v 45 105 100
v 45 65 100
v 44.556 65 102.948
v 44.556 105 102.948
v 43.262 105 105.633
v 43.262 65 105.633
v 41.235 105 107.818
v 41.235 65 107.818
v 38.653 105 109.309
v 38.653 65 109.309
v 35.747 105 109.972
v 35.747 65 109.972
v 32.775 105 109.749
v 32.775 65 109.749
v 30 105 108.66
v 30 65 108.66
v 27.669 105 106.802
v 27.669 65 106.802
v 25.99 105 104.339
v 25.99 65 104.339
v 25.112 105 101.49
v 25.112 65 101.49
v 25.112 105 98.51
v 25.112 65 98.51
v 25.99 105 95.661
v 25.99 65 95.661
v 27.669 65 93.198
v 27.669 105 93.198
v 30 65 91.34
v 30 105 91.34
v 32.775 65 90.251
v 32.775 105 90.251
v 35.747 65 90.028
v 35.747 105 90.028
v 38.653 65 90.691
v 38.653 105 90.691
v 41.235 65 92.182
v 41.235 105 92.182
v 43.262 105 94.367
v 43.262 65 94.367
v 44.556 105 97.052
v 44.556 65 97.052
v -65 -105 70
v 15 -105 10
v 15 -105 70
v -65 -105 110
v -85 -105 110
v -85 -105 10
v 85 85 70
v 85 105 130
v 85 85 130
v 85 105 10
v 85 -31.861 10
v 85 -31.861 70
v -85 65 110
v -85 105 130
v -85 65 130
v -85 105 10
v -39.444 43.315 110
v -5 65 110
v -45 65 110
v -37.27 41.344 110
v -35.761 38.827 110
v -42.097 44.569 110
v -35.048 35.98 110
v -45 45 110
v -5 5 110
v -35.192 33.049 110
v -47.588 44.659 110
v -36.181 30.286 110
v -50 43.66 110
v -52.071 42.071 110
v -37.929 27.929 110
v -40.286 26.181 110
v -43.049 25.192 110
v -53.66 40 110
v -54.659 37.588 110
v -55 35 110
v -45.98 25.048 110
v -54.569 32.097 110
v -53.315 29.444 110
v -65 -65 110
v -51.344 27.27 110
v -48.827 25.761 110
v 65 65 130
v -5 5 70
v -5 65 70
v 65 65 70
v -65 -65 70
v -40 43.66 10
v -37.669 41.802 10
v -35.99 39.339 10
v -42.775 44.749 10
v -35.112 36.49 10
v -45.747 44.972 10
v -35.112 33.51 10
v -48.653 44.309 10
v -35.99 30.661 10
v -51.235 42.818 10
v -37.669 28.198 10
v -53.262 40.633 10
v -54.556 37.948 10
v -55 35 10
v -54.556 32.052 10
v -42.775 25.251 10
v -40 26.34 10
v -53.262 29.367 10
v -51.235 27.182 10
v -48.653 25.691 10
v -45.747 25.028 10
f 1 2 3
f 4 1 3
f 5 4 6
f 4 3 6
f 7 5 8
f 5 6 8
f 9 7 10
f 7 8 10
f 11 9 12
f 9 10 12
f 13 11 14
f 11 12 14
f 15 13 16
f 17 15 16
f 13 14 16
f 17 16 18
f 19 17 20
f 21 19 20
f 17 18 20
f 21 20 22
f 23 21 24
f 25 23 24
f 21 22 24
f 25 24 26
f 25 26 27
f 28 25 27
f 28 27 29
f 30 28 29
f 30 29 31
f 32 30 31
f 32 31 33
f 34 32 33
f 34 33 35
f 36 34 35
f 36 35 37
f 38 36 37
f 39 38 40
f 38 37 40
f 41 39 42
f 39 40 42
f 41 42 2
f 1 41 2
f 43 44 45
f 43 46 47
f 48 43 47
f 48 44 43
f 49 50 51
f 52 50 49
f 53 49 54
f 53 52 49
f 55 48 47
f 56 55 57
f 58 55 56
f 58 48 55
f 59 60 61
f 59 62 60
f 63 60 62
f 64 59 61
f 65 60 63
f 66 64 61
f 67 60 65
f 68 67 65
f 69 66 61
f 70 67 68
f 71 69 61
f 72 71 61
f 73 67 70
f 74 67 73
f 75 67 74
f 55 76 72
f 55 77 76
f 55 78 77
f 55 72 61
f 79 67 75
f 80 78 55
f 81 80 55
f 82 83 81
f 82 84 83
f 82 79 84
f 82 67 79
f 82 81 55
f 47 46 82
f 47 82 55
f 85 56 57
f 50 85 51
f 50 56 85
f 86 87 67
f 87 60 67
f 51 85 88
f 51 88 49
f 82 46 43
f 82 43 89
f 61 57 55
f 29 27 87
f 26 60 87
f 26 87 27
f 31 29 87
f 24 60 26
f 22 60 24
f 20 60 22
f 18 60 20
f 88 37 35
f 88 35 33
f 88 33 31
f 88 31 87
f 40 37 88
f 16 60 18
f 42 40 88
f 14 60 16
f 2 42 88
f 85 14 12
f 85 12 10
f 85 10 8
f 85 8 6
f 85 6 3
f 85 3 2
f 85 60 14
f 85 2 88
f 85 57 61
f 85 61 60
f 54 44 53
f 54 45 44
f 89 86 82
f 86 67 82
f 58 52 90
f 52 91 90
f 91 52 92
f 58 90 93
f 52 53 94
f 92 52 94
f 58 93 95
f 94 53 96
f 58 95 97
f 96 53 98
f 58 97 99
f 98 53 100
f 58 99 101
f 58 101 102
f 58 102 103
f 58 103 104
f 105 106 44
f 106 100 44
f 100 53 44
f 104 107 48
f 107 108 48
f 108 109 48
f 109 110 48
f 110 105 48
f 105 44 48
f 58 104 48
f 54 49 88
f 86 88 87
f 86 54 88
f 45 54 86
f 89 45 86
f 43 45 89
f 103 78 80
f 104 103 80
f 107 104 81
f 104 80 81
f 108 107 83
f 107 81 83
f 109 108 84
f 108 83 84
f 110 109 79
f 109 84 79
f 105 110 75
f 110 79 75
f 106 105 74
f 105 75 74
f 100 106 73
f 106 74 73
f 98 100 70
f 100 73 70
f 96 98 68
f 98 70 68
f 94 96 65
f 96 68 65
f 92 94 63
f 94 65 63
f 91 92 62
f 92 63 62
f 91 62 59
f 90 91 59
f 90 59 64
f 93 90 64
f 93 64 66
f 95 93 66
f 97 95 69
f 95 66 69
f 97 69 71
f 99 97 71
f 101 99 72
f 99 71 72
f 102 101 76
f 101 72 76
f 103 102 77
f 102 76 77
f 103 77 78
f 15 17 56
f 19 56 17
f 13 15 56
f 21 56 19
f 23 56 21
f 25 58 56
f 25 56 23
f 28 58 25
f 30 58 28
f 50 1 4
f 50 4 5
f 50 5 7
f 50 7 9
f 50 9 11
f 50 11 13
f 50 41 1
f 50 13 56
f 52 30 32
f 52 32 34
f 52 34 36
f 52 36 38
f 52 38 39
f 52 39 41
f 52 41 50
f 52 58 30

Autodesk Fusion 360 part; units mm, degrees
sketch "Sketch1" plane through (0, 0, 0) normal (0, 0, 1) x (1, 0, 0)
  line L0 (79.2263, -110) -> (-80.7737, -110)
  line L1 (-80.7737, -110) -> (-80.7737, 110)
  line L2 (-80.7737, 110) -> (79.2263, 110)
  line L3 (79.2263, 110) -> (79.2263, -110)
  line L4 (79.2263, -110) -> (-80.7737, 110) construction
  line L5 (-80.7737, -110) -> (79.2263, 110) construction
  point P0 (-0.7737, 0)
  dimension "d1" = 160
  dimension "d2" = 220
sketch "Sketch2" plane through (0, 0, 130) normal (0, 0, 1) x (-1, 0, 0)
  line L0 (-79.2263, -110) -> (80.7737, -110)
  line L1 (80.7737, -110) -> (80.7737, 110)
  line L2 (80.7737, 110) -> (-79.2263, 110)
  line L3 (-79.2263, 110) -> (-79.2263, -110)
  line L4 (-20, 110) -> (-79.2263, 29.9287)
sketch "Sketch3" plane through (0, 0, 0) normal (0, 0, 1) x (1, 0, 0)
  line L0 (85, -105) -> (-85, -105)
  line L1 (-85, -105) -> (-85, 105)
  line L2 (-85, 105) -> (85, 105)
  line L3 (85, 105) -> (85, -105)
  line L4 (85, -105) -> (-85, 105) construction
  line L5 (-85, -105) -> (85, 105) construction
  dimension "d7" = 170
  dimension "d8" = 210
extrude "Extrude3" add sketch "Sketch3" along normal blind 130
sketch "Sketch4" plane through (0, 0, 130) normal (0, 0, 1) x (-1, 0, 0)
  line L0 (-85, -105) -> (85, -105)
  line L1 (85, -105) -> (85, 105)
  line L2 (85, 105) -> (-85, 105)
  line L3 (-85, 105) -> (-85, -105)
  line L4 (-85, 105) -> (-15, 105)
  line L5 (-85, 101.8612) -> (-85, 31.8612)
  line L6 (-15, 105) -> (-85, 31.8612)
  line L7 (85, 105) -> (65, 105)
  line L8 (65, 105) -> (65, 65)
  line L9 (85, -105) -> (85, -65)
  line L10 (85, -65) -> (-65, -65)
  line L11 (-85, -105) -> (-85, -85)
  line L12 (-65, -65) -> (-85, -85)
  line L13 (85, -65) -> (5, -65)
  line L14 (5, -65) -> (5, -5)
  line L15 (5, -5) -> (65, 65)
  line L16 (85, -65) -> (45, -65)
  line L17 (45, -65) -> (45, -35)
  circle A0 centre (45, -35) radius 10
  dimension "d11" = 70
  dimension "d12" = 70
  dimension "d15" = 20
  dimension "d16" = 40
  dimension "d17" = 40
  dimension "d18" = 150
  dimension "d19" = 20
  dimension "d20" = 80
  dimension "d21" = 60
  dimension "d26" = 40
  dimension "d27" = 30
  dimension "d28" = 20
extrude "Extrude4" cut sketch "Sketch4" against normal blind 130 contours L2 L3 L4 L5 L6
extrude "Extrude5" cut sketch "Sketch4" against normal blind 60 contours L2 L3 L6 L8 L10 L12 L14 L15
extrude "Extrude6" cut sketch "Sketch4" against normal blind 20 contours A0 | L1 L2 L7 L8 L10 L13 L14 L15 L16
extrude "Extrude7" cut sketch "Sketch4" against normal blind 130 contours A0
sketch "Sketch5" plane through (0, 65, 0) normal (0, -1, 0) x (1, 0, 0)
  line L0 (65, 130) -> (-85, 130)
  line L1 (-85, 130) -> (-85, 110)
  line L2 (-85, 110) -> (-5, 110)
  line L3 (-5, 110) -> (-5, 70)
  line L4 (-5, 70) -> (65, 70)
  line L5 (65, 70) -> (65, 130)
  line L6 (65, 130) -> (35, 130)
  line L7 (35, 130) -> (35, 100)
  circle A0 centre (35, 100) radius 10
  dimension "d31" = 30
  dimension "d32" = 30
  dimension "d33" = 20
extrude "Extrude8" cut sketch "Sketch5" against normal blind 40 contours A0
sketch "Sketch6" plane through (85, 0, 0) normal (1, 0, 0) x (0, 1, 0)
  line L0 (85, 130) -> (85, 70)
  line L1 (85, 70) -> (-31.8612, 70)
  line L2 (-31.8612, 70) -> (-31.8612, 0)
  line L3 (-31.8612, 0) -> (105, 0)
  line L4 (105, 0) -> (105, 130)
  line L5 (105, 130) -> (85, 130)
  line L6 (105, 0) -> (105, 10)
  line L7 (105, 10) -> (-105.2237, 10)
  dimension "d36" = 10
extrude "Extrude9" cut sketch "Sketch6" against normal blind 300 contours L2 L3 L4 L6 L7
sketch "Sketch7" plane through (60.2783, -57.6914, 0) normal (0.7224, -0.6914, 0) x (0.6914, 0.7224, 0)
  line L0 (35.7542, 70) -> (-65.4846, 70)
  line L1 (-65.4846, 70) -> (-65.4846, 0)
  line L2 (-65.4846, 0) -> (35.7542, 0)
  line L3 (35.7542, 0) -> (35.7542, 10)
  line L4 (35.7542, 10) -> (35.7542, 70)
  line L5 (-65.4846, 0) -> (-65.4846, 10)
  line L6 (-65.4846, 10) -> (35.7542, 10)
  dimension "d39" = 10
extrude "Extrude10" cut sketch "Sketch7" against normal blind 399 contours L1 L2 L3 L5 L6
sketch "Sketch8" plane through (0, -105, 0) normal (0, -1, 0) x (1, 0, 0)
  line L0 (-65, 110) -> (-85, 110)
  line L1 (-85, 110) -> (-85, 0)
  line L2 (-85, 0) -> (15, 0)
  line L3 (15, 0) -> (15, 10)
  line L4 (15, 10) -> (15, 70)
  line L5 (15, 70) -> (-65, 70)
  line L6 (-65, 70) -> (-65, 110)
  line L7 (15, 10) -> (-85, 10)
extrude "Extrude11" cut sketch "Sketch8" against normal blind 300 contours L1 L2 L3 L7
